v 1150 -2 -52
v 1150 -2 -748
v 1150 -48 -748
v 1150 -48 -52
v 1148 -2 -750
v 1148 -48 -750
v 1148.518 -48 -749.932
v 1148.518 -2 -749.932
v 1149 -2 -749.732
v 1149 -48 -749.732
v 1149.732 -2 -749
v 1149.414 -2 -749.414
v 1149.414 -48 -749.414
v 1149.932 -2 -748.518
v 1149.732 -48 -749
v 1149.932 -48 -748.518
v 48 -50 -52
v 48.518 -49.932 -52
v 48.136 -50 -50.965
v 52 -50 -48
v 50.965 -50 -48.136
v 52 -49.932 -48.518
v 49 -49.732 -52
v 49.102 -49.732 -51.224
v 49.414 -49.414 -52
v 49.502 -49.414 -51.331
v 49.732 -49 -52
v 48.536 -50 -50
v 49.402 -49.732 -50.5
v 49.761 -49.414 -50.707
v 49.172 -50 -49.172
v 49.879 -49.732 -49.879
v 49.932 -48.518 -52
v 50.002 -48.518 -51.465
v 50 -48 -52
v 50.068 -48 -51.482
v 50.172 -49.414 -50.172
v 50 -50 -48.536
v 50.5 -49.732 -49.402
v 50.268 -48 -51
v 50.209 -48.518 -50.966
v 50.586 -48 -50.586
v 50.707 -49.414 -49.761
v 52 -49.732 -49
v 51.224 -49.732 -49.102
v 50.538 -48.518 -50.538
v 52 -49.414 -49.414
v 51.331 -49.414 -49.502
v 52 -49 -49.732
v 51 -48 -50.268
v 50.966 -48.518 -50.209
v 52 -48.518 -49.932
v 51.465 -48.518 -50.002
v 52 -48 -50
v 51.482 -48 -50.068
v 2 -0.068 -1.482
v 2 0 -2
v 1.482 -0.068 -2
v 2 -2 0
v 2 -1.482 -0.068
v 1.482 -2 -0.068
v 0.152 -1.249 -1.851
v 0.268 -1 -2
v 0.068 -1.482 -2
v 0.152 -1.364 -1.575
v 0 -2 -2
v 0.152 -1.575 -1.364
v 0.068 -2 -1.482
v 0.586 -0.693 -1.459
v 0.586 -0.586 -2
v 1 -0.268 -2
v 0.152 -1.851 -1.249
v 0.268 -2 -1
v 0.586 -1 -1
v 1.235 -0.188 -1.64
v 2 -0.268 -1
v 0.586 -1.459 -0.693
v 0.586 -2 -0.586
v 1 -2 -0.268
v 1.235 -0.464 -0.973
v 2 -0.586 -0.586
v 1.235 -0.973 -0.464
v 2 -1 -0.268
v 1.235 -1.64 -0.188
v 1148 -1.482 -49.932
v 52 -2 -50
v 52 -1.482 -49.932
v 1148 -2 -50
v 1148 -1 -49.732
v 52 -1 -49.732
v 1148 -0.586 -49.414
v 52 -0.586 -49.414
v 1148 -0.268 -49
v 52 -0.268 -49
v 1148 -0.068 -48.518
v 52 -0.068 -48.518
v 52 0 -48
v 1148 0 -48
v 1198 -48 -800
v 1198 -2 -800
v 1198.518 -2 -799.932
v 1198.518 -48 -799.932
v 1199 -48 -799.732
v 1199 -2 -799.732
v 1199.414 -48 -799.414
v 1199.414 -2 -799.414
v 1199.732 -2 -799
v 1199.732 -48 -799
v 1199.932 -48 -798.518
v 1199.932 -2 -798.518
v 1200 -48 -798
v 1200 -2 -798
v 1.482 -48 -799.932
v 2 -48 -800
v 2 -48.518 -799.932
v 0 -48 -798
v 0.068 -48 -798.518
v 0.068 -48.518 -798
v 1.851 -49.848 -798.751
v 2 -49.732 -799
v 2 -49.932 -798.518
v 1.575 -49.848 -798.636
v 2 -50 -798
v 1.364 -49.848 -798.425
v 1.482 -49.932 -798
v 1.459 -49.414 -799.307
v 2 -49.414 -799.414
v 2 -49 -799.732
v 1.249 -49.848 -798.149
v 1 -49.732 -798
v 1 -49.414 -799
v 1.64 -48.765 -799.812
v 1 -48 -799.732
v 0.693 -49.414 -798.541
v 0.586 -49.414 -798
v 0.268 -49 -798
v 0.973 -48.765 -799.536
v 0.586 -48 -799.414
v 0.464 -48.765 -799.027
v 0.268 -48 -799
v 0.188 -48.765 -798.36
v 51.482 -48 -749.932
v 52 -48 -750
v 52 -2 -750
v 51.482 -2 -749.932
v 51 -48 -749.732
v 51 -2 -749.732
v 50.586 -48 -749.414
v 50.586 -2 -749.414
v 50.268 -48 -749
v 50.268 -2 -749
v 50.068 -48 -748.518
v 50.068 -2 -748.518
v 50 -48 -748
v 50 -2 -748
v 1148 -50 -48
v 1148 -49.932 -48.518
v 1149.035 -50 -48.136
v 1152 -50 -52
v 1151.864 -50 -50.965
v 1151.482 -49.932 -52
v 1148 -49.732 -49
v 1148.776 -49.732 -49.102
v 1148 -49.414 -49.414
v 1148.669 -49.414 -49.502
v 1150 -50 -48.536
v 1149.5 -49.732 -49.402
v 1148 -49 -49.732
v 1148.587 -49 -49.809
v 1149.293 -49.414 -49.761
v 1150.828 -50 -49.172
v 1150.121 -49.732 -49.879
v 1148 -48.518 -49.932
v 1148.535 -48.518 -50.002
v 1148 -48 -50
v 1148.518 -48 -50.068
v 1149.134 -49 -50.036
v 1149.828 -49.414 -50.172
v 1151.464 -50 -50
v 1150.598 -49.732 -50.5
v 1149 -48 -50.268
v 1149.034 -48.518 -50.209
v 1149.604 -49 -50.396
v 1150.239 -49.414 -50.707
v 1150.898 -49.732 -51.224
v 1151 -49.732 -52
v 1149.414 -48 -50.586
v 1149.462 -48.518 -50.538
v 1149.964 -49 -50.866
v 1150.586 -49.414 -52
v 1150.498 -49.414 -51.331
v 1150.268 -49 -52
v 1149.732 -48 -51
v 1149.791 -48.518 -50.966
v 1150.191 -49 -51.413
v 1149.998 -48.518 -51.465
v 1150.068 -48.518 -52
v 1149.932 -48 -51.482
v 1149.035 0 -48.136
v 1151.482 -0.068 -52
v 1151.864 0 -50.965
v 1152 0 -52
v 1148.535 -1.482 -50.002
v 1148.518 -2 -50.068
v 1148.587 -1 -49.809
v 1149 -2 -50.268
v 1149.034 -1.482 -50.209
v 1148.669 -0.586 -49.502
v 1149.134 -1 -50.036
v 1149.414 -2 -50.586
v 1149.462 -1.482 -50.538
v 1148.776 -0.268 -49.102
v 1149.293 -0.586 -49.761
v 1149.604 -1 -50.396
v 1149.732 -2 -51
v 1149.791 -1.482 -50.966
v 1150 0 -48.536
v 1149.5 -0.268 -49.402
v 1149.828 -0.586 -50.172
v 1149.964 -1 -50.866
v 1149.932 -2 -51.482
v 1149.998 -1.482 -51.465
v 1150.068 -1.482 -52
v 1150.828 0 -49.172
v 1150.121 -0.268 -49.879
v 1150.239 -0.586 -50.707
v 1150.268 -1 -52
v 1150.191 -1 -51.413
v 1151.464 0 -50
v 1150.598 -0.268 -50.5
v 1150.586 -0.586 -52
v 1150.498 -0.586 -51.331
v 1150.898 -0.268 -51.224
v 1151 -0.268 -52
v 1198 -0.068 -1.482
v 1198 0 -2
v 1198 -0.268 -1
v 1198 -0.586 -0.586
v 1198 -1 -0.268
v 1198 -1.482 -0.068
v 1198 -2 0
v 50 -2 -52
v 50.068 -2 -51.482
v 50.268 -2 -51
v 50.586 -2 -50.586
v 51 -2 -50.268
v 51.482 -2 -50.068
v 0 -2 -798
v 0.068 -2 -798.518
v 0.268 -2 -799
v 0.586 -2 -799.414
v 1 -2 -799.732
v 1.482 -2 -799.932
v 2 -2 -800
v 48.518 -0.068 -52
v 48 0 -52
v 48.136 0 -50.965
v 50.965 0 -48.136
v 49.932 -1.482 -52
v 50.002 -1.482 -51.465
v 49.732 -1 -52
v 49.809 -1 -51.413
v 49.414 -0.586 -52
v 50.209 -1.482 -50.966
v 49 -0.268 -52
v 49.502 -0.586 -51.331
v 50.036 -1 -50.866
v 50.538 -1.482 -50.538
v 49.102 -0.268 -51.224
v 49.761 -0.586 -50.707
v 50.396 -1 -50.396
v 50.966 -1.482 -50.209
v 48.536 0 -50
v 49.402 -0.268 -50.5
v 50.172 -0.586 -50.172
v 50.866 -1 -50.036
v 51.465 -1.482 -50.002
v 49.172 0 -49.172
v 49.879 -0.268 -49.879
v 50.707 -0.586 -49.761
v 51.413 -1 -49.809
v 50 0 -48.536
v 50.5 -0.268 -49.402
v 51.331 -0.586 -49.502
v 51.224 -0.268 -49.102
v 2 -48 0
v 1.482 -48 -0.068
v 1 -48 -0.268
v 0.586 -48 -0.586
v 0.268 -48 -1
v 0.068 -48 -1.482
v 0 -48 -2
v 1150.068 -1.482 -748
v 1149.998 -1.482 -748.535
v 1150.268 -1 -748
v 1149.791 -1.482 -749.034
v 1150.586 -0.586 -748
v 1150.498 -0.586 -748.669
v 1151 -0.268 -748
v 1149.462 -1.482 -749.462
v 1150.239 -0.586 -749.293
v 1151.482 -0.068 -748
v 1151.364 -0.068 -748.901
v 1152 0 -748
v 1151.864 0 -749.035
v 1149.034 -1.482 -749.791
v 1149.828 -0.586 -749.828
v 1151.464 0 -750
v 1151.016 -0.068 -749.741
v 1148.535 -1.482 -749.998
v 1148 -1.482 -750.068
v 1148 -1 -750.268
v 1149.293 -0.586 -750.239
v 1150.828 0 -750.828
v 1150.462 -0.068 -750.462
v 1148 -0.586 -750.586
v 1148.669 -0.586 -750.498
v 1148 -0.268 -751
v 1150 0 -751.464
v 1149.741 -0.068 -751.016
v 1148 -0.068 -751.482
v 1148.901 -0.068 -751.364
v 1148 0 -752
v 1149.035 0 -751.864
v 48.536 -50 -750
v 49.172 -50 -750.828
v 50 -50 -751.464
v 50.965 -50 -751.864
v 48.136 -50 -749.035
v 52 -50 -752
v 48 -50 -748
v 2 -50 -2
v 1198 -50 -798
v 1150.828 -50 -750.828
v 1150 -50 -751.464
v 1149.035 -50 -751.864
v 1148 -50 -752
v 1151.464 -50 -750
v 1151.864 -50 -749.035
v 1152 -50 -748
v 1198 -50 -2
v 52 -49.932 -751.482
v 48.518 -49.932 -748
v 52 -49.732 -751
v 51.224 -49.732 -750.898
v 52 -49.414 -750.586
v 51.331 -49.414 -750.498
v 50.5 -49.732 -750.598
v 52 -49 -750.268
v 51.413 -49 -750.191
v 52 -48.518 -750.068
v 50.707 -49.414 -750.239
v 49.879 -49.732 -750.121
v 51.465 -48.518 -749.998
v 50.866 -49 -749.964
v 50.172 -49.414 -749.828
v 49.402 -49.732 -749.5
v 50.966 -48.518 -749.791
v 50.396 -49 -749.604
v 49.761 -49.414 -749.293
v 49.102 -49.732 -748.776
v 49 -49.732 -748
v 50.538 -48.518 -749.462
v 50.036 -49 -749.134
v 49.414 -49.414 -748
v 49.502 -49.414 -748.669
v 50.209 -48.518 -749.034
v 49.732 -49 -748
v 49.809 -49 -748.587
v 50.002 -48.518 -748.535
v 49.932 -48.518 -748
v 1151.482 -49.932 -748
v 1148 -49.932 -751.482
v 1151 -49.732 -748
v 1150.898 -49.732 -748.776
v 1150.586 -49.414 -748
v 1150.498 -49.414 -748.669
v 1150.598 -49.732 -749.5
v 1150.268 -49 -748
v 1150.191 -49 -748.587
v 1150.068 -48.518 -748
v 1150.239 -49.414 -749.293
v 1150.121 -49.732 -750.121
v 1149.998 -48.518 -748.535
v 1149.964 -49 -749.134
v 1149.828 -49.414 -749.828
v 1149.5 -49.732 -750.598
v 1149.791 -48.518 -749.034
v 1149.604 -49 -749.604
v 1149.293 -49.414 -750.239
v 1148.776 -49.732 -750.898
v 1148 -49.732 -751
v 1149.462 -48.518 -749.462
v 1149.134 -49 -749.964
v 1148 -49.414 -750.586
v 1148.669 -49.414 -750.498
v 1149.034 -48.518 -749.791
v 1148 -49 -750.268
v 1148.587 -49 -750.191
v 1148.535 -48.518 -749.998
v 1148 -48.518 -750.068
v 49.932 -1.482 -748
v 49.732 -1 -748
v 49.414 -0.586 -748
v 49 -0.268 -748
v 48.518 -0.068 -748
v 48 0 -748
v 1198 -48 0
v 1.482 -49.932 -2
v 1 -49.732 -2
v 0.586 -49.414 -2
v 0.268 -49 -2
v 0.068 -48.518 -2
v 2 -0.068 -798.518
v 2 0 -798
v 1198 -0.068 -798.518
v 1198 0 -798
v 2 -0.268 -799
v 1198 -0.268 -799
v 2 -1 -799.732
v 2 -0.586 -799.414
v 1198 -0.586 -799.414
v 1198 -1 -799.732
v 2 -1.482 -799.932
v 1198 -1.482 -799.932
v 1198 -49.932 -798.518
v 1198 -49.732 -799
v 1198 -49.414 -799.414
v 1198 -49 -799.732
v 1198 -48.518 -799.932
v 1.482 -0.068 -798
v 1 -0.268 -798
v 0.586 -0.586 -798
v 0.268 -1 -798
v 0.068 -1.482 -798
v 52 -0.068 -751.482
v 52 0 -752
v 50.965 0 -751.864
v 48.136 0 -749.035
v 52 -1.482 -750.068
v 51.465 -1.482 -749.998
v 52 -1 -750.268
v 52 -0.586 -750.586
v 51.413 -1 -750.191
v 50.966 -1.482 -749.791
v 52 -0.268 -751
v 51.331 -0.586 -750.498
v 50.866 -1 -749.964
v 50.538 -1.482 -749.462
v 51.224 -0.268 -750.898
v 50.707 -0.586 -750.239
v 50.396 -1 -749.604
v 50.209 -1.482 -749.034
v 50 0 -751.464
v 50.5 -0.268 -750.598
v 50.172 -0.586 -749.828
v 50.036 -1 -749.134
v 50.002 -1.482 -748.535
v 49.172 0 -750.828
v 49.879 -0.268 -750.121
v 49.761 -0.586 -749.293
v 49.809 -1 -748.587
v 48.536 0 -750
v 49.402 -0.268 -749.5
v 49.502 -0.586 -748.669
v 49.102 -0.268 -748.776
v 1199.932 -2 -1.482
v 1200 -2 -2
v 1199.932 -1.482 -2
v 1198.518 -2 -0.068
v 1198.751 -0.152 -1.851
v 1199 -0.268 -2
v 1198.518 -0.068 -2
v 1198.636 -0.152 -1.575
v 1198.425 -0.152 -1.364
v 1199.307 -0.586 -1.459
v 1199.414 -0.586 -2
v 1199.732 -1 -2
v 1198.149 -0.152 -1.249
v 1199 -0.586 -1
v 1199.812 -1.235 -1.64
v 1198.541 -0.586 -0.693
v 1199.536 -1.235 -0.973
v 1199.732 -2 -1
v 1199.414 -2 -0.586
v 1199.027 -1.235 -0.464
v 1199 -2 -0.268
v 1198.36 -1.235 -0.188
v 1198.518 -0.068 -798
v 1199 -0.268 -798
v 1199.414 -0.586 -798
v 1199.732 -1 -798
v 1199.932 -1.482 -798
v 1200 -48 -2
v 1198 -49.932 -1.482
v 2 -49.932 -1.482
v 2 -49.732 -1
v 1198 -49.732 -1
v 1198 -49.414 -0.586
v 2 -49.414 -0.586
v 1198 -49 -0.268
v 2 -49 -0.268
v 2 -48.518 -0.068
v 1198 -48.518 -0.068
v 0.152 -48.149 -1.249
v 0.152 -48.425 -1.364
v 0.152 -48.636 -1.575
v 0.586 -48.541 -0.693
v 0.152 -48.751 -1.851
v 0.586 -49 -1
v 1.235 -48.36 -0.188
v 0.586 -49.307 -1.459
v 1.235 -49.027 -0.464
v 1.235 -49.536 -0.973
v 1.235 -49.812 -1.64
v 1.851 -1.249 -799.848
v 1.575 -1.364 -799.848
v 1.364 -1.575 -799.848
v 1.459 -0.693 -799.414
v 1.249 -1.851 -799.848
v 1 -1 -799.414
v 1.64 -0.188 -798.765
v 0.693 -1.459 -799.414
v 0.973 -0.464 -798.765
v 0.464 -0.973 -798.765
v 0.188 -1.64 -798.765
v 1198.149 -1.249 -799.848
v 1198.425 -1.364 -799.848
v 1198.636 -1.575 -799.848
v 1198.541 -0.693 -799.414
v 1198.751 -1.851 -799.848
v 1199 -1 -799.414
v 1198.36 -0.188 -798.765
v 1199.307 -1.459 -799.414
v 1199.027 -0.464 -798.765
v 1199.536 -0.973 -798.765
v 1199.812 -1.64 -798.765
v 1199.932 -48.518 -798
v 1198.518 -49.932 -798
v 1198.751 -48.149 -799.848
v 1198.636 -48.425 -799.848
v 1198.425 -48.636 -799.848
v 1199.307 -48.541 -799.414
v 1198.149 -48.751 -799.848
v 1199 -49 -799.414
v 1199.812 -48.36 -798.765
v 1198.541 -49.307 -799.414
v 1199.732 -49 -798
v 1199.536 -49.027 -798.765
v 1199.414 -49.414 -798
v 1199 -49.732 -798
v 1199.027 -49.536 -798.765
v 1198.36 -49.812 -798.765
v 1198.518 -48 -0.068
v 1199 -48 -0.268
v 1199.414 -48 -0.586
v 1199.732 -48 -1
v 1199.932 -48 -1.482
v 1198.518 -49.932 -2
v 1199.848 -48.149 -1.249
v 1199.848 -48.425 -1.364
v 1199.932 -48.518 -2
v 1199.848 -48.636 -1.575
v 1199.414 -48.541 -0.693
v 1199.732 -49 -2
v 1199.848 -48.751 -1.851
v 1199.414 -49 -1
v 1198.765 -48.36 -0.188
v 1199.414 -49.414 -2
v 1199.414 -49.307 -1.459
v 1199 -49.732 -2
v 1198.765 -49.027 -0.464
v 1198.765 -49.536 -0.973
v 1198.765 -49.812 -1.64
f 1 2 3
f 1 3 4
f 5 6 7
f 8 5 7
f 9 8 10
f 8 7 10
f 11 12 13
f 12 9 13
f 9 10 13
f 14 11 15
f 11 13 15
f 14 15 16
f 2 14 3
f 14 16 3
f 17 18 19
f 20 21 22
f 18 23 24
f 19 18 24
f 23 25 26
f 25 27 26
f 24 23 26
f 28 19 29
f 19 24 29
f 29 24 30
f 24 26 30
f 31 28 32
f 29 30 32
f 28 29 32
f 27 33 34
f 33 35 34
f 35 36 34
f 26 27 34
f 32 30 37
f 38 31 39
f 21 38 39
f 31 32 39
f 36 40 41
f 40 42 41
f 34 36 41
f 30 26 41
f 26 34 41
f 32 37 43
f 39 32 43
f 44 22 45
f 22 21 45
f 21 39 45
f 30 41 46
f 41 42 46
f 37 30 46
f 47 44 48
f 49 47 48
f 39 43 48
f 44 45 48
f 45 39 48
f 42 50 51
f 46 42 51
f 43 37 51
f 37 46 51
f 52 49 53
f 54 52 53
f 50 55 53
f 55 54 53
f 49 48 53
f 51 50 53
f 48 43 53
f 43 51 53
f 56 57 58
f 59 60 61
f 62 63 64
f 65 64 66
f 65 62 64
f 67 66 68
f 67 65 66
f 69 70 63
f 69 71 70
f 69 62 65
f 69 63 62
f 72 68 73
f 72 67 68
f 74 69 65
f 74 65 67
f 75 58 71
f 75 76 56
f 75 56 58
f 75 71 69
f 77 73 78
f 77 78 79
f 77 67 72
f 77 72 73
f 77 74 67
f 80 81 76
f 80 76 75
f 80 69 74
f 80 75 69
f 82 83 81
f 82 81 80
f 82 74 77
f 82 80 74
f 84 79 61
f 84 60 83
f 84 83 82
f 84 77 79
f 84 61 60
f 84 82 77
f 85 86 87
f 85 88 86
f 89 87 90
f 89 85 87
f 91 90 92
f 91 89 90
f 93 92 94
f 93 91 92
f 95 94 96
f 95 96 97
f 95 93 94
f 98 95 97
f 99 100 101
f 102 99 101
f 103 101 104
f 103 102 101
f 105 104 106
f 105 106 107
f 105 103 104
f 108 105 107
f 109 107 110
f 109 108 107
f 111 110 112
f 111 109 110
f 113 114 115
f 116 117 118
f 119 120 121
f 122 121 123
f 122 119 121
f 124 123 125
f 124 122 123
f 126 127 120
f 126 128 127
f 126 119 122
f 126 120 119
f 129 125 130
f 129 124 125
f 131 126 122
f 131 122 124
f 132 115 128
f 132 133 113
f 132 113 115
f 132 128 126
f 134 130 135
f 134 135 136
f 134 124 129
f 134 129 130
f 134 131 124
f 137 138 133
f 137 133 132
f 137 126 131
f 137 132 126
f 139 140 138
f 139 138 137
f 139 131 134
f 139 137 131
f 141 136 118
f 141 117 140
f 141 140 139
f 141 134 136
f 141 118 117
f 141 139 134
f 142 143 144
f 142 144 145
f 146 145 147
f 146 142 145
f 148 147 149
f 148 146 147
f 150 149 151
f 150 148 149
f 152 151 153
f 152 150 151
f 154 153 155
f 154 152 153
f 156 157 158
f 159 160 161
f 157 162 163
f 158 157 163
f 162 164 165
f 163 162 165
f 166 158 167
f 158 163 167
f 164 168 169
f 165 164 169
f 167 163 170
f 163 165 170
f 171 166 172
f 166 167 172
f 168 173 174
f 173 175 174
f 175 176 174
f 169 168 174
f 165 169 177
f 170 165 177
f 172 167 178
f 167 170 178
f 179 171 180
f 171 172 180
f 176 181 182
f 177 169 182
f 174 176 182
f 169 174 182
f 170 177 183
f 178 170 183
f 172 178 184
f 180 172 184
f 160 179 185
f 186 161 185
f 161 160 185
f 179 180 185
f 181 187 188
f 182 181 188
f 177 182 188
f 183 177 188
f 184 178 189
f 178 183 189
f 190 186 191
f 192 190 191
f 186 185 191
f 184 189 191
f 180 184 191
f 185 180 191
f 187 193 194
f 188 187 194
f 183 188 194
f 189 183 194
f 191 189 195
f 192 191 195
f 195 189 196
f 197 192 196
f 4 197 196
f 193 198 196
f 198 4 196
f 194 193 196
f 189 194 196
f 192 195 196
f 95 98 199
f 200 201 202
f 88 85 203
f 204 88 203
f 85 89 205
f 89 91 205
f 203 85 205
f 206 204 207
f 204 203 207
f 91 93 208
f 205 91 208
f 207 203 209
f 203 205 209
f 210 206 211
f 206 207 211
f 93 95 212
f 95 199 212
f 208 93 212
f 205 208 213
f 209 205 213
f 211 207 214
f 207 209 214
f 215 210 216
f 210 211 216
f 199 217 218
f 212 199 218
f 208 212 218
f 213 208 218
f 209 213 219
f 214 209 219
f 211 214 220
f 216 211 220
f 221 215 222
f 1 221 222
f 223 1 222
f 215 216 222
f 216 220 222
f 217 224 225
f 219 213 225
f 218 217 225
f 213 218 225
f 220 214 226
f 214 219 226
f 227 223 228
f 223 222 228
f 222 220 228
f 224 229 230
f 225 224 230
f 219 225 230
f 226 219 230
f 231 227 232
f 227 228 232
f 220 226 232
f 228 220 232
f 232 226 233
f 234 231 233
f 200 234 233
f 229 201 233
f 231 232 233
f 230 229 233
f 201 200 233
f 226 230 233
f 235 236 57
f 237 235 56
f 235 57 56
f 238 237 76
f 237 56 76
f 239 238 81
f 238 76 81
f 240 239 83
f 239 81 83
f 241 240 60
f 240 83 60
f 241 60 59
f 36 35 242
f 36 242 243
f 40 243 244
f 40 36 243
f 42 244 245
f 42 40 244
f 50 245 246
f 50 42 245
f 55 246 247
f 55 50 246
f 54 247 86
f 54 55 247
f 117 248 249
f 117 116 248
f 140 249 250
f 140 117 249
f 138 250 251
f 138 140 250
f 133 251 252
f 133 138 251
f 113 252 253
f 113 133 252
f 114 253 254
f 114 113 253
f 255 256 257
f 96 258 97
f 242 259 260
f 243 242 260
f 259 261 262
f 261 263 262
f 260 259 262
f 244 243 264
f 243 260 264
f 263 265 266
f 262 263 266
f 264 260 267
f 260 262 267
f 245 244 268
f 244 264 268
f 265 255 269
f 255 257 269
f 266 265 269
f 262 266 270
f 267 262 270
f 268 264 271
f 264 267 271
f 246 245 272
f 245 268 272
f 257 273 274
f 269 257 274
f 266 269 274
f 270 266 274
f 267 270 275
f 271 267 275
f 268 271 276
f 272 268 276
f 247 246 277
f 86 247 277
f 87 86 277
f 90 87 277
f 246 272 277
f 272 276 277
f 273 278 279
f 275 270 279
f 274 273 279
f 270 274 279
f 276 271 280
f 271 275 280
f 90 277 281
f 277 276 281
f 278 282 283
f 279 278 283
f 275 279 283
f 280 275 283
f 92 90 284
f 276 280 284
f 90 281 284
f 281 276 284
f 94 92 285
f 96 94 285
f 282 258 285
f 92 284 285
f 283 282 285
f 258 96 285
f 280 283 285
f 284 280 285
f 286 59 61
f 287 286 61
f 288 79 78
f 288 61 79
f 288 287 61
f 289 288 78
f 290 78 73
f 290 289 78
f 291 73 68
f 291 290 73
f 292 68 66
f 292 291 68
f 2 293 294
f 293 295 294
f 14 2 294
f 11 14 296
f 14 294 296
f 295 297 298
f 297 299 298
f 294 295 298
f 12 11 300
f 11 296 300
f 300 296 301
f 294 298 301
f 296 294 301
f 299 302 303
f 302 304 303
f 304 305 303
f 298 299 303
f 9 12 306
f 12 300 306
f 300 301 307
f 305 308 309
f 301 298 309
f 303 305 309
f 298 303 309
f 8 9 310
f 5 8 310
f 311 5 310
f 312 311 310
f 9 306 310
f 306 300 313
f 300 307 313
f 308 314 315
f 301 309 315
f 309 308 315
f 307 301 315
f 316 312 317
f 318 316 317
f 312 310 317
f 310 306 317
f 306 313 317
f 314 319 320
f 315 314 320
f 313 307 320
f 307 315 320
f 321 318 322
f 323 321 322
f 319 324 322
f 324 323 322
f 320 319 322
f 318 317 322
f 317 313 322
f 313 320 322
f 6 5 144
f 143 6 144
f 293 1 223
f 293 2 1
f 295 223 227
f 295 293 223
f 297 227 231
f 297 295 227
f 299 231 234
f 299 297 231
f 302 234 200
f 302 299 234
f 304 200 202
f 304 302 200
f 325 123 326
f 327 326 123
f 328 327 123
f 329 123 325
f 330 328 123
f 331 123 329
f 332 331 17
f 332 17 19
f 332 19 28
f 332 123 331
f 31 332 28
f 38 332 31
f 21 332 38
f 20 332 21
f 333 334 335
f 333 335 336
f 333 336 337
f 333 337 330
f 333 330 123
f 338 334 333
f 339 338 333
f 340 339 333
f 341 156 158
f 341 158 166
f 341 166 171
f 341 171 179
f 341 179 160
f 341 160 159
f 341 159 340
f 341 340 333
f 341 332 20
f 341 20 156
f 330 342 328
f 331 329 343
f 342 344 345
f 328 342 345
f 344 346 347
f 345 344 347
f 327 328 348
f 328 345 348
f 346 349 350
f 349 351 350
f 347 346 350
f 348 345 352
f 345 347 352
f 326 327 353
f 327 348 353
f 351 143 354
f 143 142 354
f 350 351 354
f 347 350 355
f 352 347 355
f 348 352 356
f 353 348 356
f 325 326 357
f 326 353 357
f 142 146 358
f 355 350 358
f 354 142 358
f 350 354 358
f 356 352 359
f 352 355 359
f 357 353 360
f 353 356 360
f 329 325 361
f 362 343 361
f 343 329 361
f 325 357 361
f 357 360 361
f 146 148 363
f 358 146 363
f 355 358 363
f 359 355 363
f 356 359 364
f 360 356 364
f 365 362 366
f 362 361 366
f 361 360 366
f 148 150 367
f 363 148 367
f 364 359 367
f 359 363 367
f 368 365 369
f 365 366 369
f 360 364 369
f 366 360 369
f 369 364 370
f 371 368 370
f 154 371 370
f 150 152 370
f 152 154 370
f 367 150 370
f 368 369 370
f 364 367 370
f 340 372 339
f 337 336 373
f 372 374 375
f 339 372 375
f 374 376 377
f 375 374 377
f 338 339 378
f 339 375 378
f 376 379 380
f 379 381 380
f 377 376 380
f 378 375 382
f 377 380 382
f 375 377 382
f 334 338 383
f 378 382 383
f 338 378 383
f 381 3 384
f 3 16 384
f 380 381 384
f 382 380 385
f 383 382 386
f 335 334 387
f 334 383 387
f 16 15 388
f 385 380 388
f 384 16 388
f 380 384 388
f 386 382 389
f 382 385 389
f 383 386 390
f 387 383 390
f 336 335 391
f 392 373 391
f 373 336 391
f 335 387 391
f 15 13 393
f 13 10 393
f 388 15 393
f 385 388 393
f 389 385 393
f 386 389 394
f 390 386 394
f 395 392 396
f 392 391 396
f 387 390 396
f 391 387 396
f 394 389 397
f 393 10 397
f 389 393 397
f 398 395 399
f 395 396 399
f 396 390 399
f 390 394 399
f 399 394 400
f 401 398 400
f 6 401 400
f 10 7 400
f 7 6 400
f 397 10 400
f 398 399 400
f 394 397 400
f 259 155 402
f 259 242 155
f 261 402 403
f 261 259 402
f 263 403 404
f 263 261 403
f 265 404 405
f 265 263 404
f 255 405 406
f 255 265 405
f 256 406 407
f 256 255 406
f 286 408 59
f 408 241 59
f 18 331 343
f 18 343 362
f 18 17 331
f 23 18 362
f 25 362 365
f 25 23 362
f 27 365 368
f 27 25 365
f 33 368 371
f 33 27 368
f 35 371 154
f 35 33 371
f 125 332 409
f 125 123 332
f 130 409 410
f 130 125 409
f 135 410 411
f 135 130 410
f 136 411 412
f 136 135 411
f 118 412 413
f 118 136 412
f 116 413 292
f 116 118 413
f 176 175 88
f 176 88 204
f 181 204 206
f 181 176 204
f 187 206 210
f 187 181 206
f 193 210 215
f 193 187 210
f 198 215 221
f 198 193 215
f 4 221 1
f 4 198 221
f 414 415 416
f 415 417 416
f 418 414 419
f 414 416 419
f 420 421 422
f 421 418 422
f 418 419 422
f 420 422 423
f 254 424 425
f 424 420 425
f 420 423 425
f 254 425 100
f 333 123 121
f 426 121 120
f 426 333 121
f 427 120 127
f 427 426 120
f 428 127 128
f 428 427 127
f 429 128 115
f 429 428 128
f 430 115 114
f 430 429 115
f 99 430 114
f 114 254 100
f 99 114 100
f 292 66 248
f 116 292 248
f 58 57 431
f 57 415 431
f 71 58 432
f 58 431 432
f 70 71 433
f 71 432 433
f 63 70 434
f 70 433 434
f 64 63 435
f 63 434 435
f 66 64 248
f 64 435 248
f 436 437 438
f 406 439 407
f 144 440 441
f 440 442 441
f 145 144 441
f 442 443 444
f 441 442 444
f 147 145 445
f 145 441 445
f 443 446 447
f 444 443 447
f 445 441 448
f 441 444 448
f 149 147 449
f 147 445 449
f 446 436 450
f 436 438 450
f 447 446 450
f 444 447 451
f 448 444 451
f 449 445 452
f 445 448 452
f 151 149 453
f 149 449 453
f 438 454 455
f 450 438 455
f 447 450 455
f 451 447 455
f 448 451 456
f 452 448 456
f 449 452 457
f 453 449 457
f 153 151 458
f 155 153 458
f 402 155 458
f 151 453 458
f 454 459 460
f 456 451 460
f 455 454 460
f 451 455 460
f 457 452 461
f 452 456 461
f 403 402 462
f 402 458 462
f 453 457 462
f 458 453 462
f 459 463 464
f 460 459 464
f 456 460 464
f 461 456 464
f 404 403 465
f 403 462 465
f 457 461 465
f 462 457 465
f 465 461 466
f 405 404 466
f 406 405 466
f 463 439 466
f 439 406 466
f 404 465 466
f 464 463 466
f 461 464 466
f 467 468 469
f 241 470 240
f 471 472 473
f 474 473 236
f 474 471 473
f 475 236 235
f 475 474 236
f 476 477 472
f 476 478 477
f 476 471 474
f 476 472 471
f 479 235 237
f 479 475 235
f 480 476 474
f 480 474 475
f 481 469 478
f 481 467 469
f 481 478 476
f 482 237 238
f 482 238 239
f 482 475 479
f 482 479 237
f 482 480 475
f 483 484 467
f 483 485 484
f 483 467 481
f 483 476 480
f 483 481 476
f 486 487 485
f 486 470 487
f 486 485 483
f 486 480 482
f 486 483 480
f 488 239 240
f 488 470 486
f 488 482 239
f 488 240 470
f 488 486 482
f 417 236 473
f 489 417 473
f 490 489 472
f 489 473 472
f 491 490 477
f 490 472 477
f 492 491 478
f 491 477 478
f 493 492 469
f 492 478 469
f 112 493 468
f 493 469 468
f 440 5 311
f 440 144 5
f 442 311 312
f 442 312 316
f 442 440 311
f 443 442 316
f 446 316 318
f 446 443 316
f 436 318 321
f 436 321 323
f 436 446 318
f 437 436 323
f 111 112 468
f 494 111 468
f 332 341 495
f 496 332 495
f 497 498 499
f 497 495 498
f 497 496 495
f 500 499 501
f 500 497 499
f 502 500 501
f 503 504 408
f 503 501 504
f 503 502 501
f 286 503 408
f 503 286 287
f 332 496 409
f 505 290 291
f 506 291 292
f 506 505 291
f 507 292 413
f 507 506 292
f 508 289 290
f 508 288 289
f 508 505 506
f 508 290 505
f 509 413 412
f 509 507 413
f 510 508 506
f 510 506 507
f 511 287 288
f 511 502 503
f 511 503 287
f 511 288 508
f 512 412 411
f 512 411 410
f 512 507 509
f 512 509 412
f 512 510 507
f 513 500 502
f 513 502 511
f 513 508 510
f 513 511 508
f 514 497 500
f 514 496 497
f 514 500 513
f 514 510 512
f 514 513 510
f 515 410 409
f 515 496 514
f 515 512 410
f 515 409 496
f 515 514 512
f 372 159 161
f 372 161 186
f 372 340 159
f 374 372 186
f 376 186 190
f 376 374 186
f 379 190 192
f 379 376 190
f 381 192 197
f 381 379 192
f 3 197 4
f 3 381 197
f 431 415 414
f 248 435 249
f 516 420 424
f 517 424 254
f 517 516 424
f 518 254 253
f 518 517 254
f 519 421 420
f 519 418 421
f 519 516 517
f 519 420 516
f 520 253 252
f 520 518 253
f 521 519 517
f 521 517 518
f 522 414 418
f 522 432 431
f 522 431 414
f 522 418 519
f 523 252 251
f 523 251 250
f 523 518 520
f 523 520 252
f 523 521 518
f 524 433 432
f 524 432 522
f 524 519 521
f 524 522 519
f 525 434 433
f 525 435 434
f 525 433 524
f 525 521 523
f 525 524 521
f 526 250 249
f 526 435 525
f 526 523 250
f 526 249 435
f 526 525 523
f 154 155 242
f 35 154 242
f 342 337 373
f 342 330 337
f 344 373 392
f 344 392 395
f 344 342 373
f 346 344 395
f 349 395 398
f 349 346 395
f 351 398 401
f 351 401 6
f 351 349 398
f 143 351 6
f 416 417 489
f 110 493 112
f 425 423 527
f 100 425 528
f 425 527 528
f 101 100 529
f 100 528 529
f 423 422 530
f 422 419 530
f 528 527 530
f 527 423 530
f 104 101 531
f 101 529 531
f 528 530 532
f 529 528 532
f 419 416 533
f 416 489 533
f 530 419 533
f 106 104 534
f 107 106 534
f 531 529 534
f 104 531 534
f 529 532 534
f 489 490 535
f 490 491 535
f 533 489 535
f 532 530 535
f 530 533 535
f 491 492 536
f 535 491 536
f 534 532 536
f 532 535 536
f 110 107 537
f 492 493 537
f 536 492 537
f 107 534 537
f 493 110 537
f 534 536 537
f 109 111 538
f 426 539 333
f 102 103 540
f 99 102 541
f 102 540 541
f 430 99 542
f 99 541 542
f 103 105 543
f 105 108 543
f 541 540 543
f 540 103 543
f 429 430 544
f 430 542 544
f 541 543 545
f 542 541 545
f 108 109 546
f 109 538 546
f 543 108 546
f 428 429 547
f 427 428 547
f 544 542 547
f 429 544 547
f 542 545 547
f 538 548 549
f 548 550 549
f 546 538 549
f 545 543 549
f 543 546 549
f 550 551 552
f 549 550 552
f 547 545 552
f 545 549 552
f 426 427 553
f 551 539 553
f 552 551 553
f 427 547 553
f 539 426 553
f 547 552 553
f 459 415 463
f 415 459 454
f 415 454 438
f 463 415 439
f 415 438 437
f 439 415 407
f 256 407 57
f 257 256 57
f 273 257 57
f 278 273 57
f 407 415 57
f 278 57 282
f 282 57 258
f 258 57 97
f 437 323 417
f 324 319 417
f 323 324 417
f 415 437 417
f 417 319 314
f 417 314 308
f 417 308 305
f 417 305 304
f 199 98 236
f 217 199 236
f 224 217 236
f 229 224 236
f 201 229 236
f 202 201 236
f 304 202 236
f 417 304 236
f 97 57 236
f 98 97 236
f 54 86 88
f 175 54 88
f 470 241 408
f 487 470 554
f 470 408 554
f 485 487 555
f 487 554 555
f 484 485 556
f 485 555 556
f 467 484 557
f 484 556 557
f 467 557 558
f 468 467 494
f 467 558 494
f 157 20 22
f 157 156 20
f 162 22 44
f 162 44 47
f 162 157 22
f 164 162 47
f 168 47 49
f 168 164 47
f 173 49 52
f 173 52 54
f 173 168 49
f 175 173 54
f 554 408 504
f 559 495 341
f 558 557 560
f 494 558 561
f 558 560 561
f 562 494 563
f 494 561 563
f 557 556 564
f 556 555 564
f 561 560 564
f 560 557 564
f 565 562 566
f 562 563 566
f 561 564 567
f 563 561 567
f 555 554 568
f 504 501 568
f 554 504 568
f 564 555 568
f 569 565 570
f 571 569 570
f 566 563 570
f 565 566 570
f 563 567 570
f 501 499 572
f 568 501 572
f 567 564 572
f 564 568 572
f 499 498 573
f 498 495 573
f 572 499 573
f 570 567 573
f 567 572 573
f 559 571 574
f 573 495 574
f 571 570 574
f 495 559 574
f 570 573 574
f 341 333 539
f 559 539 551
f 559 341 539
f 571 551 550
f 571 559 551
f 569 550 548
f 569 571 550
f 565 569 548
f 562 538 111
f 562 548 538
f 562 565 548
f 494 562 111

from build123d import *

# Parameters (mm, degrees)
F0_W     = 50
F0_H     = 700
F1_DEPTH = 50
F2_F1_R  = 2
F2_F2_R  = 2
F2_F3_R  = 2


with BuildPart() as f1:
    # F0 (on Front) → F1 (new body)
    with BuildSketch(Plane.XZ):
        Polygon((1200, 0), (0, 0), (0, -50), (50, -50), (1150, -50), (1200, -50), align=None)
        with Locations((25, -400)):
            Rectangle(F0_W, F0_H)
        Polygon((50, -750), (0, -750), (0, -800), (1200, -800), (1200, -750), (1150, -750), align=None)
        with Locations((1175, -400)):
            Rectangle(F0_W, F0_H)
    extrude(amount=F1_DEPTH)

    # F2: fillet of radius 2 on 22 edges, made by hand

    # F2_f1
    f2_f1_edges = [f1.edges().sort_by_distance(p)[0] for p in [
        (50, -25, -50),
        (1150, -25, -50),
        (1150, -25, -750),
        (50, -25, -750),
    ]]
    fillet(f2_f1_edges, radius=F2_F1_R)

    # F2_f2
    f2_f2_edges = [f1.edges().sort_by_distance(p)[0] for p in [
        (600, -50, 0),
        (1200, -25, 0),
        (1200, -50, -400),
        (1200, 0, -400),
        (600, 0, 0),
        (0, 0, -400),
        (600, 0, -800),
        (600, -50, -50),
        (600, -50, -750),
        (0, -25, -800),
        (1200, -25, -800),
        (600, -50, -800),
        (0, -25, 0),
        (0, -50, -400),
        (1149.4142135624, -50, -749.4142135624),
        (50.5857864376, -50, -749.4142135624),
        (50.5857864376, -50, -50.5857864376),
        (1149.4142135624, -50, -50.5857864376),
    ]]
    fillet(f2_f2_edges, radius=F2_F2_R)

    # F2_f3
    f2_f3_edges = [f1.edges().sort_by_distance(p)[0] for p in [
        (600, 0, -750),
        (50, 0, -400),
        (600, 0, -50),
        (1150, 0, -400),
        (1149.4142135624, 0, -50.5857864376),
        (1149.4142135624, 0, -749.4142135624),
        (50.5857864376, 0, -50.5857864376),
        (50.5857864376, 0, -749.4142135624),
    ]]
    fillet(f2_f3_edges, radius=F2_F3_R)


solid = f1.part
